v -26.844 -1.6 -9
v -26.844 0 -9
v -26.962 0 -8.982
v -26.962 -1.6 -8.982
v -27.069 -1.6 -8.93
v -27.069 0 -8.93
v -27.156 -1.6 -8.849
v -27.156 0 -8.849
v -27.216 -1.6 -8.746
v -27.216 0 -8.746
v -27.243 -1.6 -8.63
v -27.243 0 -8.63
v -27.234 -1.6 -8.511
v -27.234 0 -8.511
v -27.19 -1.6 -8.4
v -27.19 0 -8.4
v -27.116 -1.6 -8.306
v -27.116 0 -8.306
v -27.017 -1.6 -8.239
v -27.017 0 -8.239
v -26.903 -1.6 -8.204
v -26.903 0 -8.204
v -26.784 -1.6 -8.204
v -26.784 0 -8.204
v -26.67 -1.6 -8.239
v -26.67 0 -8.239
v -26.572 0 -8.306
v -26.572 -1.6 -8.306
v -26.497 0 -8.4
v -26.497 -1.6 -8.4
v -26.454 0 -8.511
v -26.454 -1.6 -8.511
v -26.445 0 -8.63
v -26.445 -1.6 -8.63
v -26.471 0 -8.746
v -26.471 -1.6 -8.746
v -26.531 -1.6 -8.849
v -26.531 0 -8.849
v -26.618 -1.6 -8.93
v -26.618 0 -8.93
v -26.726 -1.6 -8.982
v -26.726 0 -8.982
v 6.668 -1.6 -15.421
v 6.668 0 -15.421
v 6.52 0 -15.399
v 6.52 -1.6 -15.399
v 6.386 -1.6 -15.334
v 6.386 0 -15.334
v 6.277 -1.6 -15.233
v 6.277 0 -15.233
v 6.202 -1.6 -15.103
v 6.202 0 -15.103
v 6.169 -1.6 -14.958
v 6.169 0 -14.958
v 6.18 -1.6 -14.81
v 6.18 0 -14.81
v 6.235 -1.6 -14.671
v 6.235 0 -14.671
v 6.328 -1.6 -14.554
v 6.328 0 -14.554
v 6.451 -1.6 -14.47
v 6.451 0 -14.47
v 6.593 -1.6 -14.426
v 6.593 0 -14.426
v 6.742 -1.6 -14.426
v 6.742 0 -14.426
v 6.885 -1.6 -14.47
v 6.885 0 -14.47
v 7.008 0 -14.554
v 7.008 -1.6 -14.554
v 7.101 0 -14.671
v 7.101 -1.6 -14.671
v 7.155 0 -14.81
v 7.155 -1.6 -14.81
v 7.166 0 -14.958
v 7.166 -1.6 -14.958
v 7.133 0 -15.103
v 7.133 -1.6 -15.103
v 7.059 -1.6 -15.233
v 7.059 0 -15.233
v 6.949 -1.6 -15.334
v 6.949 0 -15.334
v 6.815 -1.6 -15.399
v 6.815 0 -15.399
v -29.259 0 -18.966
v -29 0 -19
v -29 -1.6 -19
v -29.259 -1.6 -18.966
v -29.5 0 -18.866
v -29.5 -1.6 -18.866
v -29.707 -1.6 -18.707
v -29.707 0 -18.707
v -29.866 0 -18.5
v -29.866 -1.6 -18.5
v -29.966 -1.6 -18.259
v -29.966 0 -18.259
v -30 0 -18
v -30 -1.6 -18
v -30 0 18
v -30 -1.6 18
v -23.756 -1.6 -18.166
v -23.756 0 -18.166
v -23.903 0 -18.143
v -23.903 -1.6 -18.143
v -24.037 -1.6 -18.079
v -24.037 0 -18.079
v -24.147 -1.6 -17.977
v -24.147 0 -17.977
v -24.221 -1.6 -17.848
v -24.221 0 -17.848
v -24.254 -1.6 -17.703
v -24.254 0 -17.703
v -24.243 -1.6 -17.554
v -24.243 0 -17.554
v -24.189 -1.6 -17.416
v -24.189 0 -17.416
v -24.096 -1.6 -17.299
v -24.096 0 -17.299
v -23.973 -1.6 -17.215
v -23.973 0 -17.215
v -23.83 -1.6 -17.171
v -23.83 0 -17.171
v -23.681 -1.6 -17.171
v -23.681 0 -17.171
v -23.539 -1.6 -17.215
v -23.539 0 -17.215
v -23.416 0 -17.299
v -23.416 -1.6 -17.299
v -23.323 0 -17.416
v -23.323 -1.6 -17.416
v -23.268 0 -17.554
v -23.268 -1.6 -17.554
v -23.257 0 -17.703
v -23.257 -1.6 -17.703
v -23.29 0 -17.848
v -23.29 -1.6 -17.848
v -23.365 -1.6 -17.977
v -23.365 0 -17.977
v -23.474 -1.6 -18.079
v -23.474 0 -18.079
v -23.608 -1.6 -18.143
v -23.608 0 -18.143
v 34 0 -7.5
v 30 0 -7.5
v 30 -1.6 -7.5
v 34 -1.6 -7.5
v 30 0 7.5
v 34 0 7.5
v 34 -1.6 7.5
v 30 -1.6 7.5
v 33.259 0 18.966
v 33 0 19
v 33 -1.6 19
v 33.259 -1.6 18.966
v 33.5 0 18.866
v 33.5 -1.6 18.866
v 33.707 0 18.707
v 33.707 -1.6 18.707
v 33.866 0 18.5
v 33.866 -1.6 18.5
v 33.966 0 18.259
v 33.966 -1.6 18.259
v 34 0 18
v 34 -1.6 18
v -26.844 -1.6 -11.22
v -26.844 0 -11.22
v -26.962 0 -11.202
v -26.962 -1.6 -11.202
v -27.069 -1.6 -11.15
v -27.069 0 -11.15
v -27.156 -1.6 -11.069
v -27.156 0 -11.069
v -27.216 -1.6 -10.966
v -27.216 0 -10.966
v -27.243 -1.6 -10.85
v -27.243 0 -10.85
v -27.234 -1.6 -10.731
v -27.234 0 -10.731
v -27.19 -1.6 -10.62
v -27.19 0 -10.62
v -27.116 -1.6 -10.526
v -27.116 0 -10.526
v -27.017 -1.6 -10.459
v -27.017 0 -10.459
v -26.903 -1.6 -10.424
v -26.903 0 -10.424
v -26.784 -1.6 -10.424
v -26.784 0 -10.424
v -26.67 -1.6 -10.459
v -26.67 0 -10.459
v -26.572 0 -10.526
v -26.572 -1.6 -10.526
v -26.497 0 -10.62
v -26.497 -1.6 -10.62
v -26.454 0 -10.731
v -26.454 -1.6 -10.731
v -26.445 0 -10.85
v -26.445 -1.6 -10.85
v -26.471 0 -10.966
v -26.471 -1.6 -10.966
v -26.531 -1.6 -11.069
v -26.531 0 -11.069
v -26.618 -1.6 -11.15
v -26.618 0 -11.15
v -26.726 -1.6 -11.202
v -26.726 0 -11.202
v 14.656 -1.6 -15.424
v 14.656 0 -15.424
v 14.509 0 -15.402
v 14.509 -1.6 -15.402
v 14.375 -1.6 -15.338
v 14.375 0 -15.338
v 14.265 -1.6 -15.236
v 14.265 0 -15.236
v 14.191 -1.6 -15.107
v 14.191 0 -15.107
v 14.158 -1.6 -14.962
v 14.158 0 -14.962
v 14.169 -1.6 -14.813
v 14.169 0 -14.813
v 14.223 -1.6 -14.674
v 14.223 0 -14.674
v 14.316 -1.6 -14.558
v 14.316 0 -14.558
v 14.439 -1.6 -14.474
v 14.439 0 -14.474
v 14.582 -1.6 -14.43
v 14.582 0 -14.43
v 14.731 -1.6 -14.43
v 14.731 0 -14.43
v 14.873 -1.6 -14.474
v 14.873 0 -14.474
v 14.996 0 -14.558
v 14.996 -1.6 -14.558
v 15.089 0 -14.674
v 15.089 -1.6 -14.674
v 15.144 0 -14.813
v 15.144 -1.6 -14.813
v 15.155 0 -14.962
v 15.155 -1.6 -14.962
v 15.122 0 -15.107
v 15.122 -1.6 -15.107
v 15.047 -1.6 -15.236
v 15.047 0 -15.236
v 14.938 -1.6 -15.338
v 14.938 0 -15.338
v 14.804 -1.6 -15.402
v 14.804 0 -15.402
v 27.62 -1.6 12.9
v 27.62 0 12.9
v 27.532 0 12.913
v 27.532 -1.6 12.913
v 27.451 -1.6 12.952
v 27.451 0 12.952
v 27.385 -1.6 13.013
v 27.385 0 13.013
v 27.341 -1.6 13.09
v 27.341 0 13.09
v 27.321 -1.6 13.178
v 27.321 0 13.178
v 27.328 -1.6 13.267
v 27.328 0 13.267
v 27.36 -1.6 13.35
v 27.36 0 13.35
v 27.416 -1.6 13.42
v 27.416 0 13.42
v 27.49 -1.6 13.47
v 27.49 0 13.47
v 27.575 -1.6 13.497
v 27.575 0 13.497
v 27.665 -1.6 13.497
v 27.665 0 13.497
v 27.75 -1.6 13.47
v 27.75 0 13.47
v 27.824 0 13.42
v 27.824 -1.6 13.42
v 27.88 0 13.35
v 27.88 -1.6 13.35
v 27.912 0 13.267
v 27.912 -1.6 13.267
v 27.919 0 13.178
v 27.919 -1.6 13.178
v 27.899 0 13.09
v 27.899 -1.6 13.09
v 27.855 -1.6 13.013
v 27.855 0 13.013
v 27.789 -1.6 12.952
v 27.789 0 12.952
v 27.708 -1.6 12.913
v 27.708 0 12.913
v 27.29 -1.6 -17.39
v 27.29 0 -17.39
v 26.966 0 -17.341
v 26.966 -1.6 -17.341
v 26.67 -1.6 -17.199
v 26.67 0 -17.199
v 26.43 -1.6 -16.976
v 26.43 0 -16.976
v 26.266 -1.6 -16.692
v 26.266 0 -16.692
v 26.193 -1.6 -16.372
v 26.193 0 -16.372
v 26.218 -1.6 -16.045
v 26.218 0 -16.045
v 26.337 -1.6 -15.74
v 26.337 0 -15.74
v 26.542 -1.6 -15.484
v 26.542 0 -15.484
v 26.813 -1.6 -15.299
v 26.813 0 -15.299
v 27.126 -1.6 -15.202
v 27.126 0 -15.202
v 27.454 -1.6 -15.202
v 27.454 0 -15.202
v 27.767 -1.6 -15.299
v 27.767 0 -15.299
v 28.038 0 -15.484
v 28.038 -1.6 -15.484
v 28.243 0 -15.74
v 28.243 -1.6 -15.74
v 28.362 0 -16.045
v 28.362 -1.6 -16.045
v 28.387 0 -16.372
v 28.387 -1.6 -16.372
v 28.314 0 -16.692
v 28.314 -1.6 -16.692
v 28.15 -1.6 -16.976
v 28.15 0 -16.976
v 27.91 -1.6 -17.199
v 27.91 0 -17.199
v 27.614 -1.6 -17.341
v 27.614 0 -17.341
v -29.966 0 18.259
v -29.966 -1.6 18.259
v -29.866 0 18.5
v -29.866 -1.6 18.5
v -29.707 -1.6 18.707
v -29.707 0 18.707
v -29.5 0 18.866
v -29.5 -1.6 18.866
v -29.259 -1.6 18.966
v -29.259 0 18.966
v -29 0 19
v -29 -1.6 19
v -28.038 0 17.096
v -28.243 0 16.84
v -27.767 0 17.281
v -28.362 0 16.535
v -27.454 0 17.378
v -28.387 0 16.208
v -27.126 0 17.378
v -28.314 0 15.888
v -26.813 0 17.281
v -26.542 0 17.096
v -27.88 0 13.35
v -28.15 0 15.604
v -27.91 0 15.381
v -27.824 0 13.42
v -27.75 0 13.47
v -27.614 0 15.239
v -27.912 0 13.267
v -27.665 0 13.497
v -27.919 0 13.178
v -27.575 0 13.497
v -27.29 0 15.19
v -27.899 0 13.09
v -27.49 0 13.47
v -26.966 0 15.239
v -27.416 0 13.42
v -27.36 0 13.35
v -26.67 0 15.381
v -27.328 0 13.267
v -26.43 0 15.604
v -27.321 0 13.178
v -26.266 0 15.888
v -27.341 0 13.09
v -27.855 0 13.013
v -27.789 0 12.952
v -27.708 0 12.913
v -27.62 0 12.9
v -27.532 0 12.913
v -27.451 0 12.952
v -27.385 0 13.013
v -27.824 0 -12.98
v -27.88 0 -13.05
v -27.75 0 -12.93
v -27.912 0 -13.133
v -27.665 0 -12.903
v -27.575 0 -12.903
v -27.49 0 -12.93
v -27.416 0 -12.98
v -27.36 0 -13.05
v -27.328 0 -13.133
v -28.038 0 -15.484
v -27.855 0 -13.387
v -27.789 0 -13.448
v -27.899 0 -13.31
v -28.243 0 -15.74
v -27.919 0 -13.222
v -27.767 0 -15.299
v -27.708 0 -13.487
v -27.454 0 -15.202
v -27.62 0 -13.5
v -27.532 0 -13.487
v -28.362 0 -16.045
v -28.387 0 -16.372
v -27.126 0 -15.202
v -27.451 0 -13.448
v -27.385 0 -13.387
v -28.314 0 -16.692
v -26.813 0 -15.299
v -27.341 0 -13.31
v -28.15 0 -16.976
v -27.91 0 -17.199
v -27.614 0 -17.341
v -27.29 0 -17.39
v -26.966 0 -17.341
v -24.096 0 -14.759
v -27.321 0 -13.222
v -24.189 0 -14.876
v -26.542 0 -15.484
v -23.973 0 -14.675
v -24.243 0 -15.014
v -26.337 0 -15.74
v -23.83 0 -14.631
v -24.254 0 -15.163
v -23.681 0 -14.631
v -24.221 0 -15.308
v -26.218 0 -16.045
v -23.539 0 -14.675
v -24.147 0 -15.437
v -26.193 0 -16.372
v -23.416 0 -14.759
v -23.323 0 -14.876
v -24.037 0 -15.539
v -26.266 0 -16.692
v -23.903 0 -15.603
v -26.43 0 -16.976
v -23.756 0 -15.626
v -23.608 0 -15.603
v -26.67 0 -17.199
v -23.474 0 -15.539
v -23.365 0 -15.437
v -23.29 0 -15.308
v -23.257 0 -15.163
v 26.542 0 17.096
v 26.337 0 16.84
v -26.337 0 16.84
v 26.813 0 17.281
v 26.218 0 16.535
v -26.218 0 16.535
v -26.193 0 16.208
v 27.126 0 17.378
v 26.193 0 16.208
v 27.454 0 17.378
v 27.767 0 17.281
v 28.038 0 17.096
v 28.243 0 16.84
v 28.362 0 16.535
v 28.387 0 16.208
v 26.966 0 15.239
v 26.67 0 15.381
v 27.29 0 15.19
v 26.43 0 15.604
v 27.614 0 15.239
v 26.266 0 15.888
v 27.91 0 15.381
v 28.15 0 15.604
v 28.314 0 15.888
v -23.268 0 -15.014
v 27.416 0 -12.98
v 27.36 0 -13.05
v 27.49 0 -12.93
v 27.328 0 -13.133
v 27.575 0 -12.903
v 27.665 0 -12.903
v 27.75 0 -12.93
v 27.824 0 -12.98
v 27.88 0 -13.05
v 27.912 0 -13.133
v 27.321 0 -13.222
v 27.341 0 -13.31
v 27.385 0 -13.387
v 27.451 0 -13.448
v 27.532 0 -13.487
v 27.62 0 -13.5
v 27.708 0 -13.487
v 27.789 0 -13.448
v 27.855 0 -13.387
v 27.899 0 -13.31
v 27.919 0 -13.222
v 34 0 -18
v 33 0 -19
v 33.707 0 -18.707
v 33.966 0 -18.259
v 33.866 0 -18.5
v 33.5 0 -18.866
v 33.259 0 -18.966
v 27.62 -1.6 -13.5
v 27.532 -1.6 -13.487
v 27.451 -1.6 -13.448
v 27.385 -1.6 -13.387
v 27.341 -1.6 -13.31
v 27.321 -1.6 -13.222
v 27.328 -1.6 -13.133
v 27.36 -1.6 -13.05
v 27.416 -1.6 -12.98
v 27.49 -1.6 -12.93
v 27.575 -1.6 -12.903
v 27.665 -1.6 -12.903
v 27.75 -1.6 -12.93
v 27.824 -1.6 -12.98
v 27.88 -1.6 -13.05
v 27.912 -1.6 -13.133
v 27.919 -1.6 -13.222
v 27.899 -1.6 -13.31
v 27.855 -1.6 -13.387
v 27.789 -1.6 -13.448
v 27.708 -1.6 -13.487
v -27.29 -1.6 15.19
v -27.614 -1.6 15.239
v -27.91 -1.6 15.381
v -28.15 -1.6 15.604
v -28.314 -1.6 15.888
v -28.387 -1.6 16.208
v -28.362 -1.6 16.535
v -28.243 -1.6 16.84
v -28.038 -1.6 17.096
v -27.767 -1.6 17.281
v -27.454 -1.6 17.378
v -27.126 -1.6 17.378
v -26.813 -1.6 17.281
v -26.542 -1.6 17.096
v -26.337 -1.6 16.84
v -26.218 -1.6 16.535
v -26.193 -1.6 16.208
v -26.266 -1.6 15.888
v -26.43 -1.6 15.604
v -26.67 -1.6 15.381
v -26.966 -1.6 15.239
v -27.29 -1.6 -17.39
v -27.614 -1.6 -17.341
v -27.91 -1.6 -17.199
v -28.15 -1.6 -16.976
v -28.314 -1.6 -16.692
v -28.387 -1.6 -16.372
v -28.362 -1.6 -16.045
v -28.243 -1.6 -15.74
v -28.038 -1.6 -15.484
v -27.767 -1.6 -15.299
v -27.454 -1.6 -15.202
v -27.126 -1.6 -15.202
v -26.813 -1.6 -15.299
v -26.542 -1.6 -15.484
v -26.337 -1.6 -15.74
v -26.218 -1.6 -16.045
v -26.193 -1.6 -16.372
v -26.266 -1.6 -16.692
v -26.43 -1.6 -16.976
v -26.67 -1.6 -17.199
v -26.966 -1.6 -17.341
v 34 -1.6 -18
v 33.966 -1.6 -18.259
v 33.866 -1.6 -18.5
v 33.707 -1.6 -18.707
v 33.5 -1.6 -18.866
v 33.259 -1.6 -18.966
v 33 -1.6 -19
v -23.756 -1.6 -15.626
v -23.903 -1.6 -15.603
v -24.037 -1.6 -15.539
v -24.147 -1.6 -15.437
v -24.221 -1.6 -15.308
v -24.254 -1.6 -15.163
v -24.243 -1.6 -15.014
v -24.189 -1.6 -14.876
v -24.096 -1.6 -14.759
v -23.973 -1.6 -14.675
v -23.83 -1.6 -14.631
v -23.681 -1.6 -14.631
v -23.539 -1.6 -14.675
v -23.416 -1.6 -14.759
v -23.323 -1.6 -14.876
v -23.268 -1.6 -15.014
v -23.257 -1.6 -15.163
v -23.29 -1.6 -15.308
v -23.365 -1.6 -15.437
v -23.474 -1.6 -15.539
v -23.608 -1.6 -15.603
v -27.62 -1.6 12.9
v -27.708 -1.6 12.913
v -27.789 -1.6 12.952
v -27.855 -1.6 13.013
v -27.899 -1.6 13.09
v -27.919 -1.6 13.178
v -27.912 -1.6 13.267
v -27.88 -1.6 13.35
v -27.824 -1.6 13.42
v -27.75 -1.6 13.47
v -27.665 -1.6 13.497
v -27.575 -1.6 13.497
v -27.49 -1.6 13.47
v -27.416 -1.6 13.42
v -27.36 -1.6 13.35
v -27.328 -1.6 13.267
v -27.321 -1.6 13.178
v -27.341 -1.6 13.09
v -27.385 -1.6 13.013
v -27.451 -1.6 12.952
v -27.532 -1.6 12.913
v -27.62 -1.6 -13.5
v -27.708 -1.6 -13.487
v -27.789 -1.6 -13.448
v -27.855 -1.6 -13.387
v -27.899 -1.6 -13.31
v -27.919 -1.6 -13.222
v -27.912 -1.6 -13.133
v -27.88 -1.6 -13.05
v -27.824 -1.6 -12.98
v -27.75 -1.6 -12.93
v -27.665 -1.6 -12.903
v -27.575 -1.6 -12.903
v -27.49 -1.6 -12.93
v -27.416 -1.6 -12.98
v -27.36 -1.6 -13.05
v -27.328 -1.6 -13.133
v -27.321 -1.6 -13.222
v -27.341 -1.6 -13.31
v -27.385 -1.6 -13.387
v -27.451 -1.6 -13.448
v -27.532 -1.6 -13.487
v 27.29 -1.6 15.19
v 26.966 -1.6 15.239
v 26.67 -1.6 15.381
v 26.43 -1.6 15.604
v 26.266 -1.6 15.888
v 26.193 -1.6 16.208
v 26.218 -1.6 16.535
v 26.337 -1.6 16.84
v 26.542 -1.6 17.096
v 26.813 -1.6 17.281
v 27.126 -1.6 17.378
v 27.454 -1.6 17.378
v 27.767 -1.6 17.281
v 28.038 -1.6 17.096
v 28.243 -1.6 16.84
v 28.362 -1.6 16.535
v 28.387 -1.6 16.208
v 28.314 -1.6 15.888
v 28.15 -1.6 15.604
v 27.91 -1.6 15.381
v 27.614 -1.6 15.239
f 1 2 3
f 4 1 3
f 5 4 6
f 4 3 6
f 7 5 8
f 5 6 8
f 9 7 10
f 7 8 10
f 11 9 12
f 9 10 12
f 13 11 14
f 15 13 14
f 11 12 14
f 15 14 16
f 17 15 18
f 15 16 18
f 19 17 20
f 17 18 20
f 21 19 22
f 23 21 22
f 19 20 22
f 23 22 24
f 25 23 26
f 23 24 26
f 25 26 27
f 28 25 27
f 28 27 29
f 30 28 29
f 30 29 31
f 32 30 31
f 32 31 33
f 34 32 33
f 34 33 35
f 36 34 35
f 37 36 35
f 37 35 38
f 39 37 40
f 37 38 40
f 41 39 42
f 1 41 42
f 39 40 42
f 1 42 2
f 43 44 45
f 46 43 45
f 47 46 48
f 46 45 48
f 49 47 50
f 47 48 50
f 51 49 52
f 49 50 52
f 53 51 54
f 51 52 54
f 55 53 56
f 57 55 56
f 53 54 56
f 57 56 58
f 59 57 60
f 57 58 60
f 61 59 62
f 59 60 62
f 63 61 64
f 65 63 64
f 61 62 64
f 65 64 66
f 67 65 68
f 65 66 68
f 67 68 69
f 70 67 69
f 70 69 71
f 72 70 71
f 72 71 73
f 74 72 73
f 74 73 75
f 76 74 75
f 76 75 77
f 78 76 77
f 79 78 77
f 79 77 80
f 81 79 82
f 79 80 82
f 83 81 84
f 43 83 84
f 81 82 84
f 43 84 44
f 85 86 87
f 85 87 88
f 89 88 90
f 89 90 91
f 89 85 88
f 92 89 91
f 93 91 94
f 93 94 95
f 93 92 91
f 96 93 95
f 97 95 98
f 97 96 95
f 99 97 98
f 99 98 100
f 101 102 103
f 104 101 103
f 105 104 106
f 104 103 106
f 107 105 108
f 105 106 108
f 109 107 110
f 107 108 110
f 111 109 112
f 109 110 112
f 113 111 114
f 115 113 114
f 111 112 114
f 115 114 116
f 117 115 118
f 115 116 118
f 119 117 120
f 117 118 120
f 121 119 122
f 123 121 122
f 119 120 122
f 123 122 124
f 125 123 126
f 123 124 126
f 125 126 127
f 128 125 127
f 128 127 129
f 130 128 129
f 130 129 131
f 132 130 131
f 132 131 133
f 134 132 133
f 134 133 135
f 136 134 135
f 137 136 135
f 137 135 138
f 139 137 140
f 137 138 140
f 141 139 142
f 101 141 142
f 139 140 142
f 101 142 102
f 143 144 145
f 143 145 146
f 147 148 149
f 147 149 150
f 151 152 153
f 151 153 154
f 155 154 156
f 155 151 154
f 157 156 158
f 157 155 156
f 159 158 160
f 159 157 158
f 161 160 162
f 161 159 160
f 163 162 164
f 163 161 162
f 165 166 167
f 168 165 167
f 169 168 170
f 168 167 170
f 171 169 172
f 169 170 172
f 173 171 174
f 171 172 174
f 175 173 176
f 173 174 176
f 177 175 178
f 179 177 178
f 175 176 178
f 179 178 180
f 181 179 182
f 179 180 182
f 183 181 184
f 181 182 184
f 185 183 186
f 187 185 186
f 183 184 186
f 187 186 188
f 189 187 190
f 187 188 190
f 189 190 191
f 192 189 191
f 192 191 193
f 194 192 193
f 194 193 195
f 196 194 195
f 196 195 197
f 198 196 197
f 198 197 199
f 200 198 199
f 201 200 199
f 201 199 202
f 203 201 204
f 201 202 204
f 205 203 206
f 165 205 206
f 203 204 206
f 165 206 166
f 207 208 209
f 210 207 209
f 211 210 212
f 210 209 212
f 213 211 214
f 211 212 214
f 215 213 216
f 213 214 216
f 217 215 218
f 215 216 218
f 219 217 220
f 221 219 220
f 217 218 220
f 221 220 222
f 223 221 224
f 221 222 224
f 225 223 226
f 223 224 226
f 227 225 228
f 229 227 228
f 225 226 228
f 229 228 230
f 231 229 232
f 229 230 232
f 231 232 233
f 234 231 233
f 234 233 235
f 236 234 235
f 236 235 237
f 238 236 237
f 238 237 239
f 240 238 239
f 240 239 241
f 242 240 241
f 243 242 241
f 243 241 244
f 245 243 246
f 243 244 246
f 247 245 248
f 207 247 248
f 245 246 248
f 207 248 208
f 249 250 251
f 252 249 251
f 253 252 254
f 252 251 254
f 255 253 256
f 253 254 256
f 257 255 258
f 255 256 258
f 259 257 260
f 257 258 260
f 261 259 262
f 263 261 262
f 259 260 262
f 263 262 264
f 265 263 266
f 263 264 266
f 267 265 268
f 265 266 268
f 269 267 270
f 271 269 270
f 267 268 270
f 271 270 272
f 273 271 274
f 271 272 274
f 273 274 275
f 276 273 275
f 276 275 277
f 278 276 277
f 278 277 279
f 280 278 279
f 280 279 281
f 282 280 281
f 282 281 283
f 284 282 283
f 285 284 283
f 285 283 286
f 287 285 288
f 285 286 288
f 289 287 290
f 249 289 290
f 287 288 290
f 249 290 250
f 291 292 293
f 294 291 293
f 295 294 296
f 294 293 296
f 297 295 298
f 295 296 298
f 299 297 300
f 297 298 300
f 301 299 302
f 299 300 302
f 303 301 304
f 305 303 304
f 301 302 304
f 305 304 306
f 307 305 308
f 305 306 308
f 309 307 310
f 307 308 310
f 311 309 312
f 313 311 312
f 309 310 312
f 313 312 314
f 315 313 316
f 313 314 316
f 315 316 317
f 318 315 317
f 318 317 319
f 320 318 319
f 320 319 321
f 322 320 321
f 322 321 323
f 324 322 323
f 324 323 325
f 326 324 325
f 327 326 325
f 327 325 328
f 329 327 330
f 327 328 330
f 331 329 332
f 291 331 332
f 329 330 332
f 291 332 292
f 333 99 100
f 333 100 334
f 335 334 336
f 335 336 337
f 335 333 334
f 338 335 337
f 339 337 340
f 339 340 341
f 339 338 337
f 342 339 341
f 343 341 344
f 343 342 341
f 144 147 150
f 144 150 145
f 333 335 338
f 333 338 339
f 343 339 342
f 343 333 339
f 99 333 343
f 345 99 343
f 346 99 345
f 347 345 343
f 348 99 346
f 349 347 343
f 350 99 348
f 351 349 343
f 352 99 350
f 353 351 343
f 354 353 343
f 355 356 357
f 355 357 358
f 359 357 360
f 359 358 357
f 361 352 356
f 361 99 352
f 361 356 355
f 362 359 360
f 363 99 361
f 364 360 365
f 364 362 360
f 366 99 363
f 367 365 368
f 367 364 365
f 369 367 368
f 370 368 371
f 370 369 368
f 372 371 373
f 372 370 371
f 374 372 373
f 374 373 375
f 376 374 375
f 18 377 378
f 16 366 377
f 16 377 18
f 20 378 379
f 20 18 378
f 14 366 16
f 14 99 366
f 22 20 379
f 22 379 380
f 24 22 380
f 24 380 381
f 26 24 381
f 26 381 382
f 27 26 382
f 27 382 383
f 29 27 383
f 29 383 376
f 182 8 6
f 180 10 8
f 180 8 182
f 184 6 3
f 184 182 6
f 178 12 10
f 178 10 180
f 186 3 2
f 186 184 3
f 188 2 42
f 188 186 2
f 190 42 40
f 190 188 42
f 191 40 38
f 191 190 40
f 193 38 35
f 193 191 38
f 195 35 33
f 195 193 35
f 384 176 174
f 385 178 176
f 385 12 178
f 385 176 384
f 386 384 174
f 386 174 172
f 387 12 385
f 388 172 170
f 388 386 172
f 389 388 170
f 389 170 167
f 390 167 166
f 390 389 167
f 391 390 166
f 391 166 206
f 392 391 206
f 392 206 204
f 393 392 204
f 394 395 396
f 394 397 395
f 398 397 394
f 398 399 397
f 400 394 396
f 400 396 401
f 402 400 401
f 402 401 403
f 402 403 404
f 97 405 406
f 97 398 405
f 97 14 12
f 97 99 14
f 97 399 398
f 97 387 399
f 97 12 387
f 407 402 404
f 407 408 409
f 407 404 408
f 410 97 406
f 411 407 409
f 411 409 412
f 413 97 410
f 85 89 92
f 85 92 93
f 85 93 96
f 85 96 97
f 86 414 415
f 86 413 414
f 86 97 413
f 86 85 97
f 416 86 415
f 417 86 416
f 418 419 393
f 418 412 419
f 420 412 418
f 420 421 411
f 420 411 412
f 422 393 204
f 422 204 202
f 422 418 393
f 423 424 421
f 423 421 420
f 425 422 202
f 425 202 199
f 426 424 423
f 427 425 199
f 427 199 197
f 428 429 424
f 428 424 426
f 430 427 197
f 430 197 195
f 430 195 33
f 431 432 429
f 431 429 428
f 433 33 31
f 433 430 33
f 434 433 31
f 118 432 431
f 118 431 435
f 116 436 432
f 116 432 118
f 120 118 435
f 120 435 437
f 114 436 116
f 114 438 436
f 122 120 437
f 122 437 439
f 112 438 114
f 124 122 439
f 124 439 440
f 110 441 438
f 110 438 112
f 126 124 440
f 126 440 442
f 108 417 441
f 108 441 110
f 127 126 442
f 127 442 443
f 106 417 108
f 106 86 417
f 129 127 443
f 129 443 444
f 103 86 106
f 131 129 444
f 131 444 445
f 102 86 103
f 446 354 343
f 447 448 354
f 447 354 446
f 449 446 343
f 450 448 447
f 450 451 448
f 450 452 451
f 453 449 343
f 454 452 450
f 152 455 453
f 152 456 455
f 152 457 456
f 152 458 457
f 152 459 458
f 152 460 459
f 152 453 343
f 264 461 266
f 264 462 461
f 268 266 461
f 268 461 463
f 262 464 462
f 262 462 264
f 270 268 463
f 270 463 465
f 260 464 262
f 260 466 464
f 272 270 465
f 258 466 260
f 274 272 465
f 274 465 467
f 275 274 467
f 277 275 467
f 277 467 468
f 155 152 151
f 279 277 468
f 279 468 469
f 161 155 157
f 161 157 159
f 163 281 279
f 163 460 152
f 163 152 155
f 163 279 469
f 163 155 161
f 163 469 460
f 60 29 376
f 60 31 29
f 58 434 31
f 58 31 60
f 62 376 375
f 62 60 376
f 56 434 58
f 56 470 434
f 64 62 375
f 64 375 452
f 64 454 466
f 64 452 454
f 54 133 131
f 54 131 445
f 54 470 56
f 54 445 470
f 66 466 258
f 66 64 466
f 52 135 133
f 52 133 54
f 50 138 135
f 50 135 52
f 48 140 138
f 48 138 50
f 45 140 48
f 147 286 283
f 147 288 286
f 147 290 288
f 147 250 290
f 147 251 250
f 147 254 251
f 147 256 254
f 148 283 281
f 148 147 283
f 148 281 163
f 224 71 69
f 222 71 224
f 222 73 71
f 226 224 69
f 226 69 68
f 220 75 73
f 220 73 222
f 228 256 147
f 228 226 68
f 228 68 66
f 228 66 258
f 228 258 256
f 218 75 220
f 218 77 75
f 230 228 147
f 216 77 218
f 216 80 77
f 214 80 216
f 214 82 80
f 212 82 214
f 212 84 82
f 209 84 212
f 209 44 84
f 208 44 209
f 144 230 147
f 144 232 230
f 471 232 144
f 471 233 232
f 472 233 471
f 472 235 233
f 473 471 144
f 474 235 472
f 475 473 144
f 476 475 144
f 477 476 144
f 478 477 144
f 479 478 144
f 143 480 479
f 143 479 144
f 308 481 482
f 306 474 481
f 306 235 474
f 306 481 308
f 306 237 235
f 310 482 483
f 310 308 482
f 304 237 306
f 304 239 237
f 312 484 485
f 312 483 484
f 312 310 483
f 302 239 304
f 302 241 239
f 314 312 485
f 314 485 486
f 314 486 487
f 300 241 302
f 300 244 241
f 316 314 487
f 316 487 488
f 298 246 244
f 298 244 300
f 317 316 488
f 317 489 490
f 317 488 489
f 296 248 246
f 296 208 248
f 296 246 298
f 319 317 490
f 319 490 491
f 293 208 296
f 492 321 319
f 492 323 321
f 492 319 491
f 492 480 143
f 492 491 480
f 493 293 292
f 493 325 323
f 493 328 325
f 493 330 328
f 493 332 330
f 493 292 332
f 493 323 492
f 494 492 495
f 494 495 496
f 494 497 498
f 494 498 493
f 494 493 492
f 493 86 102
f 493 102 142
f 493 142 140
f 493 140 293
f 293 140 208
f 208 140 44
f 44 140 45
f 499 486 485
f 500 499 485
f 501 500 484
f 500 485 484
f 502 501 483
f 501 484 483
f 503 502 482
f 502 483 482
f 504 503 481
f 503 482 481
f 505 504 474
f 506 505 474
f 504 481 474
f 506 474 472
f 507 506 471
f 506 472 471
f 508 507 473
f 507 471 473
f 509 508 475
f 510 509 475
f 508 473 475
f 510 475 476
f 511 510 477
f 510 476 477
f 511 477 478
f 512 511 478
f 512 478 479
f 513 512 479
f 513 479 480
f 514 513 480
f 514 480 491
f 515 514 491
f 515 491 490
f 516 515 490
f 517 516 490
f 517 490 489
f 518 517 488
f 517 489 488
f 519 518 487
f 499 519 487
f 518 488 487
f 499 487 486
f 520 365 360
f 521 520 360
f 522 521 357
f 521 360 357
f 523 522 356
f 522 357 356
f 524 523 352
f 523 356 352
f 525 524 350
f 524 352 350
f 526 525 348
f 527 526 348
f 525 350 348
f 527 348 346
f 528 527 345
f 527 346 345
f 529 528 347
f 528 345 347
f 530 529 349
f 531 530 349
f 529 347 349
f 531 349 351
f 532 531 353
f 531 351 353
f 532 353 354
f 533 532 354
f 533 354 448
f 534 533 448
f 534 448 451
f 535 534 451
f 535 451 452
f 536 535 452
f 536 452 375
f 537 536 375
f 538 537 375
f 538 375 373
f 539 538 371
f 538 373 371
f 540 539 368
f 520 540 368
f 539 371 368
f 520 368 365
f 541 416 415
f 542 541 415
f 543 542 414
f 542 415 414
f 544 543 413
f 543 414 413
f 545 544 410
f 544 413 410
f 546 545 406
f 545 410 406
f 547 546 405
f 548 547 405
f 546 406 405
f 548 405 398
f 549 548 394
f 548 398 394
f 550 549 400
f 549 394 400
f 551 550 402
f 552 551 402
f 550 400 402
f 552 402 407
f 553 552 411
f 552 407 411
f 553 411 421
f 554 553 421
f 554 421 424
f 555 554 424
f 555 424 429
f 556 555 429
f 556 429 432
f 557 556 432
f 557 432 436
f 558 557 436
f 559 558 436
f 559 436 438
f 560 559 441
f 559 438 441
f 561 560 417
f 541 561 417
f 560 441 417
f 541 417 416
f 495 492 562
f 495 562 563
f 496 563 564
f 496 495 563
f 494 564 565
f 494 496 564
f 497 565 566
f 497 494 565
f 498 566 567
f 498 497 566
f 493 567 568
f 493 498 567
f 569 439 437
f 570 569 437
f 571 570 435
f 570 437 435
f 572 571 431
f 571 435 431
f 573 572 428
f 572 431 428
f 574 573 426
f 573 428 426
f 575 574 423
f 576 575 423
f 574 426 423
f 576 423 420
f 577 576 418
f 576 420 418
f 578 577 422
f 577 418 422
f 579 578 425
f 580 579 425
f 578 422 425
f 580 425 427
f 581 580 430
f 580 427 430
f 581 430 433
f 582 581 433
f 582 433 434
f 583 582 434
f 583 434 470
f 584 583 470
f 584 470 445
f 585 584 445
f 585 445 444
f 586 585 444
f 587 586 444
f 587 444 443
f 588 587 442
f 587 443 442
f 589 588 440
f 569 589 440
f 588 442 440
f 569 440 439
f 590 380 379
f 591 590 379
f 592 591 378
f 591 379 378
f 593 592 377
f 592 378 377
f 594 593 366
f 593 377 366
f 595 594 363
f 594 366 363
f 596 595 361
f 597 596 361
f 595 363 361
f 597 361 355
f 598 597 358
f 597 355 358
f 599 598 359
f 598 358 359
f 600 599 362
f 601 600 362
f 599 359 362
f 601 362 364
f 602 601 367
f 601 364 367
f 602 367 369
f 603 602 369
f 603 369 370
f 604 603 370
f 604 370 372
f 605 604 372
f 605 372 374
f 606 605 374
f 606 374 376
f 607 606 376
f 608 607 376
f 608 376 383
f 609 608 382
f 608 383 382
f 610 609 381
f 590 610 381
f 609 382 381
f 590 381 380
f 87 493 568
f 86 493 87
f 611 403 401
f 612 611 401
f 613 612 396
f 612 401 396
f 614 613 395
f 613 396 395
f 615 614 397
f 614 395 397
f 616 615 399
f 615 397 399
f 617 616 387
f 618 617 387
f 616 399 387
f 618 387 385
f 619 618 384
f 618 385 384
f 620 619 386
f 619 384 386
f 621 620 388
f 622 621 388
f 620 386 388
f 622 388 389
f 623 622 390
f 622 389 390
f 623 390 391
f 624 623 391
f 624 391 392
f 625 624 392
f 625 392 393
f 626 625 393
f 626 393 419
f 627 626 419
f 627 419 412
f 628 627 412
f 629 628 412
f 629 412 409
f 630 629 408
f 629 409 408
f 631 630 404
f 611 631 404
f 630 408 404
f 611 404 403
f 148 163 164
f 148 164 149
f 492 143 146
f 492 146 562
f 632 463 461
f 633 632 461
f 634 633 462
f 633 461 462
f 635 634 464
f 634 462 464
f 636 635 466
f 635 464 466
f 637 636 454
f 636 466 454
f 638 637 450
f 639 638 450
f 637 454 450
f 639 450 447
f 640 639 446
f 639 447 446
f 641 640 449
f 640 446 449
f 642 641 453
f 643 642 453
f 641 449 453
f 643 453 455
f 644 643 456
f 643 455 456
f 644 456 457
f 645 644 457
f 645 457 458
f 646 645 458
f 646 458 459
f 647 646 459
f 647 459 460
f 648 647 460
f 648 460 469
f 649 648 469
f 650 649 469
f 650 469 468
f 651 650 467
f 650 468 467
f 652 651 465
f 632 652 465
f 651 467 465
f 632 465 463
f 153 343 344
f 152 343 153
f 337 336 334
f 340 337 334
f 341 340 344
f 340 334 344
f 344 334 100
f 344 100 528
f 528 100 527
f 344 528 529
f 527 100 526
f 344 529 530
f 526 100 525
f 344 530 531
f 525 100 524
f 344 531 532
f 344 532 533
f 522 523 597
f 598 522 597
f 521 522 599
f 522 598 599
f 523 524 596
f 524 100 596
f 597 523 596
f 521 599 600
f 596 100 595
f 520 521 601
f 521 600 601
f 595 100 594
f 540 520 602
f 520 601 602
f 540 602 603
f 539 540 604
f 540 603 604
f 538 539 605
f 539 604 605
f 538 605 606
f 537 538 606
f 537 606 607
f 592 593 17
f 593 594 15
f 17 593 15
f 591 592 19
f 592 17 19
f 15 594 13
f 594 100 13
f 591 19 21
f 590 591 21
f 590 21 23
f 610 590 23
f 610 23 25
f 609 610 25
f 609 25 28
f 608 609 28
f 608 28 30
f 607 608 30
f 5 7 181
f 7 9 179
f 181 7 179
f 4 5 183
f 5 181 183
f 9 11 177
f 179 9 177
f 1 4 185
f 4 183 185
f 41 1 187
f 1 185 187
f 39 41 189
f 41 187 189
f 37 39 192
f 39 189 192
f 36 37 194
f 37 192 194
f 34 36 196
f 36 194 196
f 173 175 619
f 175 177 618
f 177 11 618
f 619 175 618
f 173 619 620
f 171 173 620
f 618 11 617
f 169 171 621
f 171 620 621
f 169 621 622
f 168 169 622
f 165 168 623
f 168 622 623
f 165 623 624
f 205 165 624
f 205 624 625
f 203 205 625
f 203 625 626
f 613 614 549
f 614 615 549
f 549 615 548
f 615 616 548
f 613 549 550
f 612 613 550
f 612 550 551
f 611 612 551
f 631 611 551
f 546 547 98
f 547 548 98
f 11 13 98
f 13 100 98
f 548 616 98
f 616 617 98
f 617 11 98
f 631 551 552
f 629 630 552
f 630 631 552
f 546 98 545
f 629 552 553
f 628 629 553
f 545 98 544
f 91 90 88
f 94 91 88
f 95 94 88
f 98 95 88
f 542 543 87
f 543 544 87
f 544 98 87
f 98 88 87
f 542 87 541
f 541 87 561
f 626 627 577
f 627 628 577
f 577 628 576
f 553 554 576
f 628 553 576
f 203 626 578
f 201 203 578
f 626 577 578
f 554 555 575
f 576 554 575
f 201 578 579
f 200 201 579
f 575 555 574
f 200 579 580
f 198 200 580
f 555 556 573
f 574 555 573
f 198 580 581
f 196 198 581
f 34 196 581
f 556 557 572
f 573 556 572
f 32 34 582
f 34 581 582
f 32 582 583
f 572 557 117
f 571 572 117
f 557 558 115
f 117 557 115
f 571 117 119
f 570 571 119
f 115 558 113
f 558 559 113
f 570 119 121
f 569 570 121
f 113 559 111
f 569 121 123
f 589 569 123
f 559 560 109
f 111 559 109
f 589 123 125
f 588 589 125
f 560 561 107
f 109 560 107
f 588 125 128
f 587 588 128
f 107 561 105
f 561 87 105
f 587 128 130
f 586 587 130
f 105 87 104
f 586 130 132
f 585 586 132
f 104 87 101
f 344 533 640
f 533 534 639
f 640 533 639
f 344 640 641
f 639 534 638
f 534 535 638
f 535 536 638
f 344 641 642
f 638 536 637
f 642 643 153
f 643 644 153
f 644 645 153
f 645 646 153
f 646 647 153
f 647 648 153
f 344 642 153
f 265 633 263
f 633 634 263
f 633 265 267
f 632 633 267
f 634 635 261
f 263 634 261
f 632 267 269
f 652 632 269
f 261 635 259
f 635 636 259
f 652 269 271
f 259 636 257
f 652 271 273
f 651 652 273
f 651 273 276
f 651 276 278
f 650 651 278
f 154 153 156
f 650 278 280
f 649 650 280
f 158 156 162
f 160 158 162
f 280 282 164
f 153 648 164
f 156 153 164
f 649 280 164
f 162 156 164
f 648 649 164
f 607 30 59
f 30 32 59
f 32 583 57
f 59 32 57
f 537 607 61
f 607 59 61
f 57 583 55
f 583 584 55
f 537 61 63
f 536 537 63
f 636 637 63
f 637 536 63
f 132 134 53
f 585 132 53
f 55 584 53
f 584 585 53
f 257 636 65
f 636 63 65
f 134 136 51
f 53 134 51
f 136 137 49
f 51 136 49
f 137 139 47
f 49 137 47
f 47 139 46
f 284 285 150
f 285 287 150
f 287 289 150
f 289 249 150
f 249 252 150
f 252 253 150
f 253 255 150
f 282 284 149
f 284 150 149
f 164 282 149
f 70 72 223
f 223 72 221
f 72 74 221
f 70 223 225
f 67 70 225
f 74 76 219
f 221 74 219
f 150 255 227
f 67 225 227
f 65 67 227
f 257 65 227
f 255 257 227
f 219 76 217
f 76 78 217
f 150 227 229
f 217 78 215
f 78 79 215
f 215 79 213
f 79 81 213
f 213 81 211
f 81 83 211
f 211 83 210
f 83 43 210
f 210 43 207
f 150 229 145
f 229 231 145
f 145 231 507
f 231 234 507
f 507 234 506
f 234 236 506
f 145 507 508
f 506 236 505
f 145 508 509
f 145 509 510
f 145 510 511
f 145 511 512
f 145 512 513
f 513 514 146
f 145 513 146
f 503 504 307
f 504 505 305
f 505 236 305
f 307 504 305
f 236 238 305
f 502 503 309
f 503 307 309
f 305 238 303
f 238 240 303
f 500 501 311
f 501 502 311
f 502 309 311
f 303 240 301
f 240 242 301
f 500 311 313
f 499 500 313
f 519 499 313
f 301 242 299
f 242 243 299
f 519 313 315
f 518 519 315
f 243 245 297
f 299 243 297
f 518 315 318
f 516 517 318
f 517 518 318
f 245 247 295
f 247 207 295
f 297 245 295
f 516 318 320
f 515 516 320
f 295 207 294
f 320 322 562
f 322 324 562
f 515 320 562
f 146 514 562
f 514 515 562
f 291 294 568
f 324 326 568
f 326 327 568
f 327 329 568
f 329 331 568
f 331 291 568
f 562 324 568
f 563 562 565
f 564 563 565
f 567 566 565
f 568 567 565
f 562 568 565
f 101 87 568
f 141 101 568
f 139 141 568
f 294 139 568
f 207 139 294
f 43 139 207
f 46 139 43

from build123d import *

# Parameters (mm, degrees)
SKETCH1_R           = 0.2999994
SKETCH1_R_2         = 1.1
SKETCH1_R_3         = 0.499999
SKETCH1_R_4         = 0.3999992
BOSS_EXTRUDE1_DEPTH = 1.6


with BuildPart() as part:
    # Sketch1 → Boss-Extrude1 (new body)
    with BuildSketch(Plane(origin=(0, 0, 0), x_dir=(1, 0, 0), z_dir=(0, 1, 0))):
        with BuildLine():
            Line((34, -18), (34, -7.5))
            Line((34, -7.5), (30, -7.5))
            Line((30, -7.5), (30, 7.5))
            Line((30, 7.5), (34, 7.5))
            Line((34, 7.5), (34, 18))
            ThreePointArc((34, 18), (33.707106781, 18.707106781), (33, 19))
            Line((33, 19), (-29, 19))
            ThreePointArc((-29, 19), (-29.707106781, 18.707106781), (-30, 18))
            Line((-30, 18), (-30, -18))
            ThreePointArc((-30, -18), (-29.707106781, -18.707106781), (-29, -19))
            Line((-29, -19), (33, -19))
            ThreePointArc((33, -19), (33.707106781, -18.707106781), (34, -18))
        make_face()
        with Locations(Location((27.62000064, 13.199999, 0), (0, 0, 90))):
            Circle(SKETCH1_R, mode=Mode.SUBTRACT)
        with Locations(Location((27.28999876, -16.29000044, 0), (0, 0, 90))):
            Circle(SKETCH1_R_2, mode=Mode.SUBTRACT)
        with Locations(Location((27.62000064, -13.199999, 0), (0, 0, 90))):
            Circle(SKETCH1_R, mode=Mode.SUBTRACT)
        with Locations(Location((14.65628514, 14.92444056, 0), (0, 0, 90))):
            Circle(SKETCH1_R_3, mode=Mode.SUBTRACT)
        with Locations(Location((27.28999876, 16.29000044, 0), (0, 0, 90))):
            Circle(SKETCH1_R_2, mode=Mode.SUBTRACT)
        with Locations(Location((6.6676143, 14.9207728, 0), (0, 0, 90))):
            Circle(SKETCH1_R_3, mode=Mode.SUBTRACT)
        with Locations(Location((-23.75582498, 15.12569238, 0), (0, 0, 90))):
            Circle(SKETCH1_R_3, mode=Mode.SUBTRACT)
        with Locations(Location((-26.84364202, 8.59971356, 0), (0, 0, 90))):
            Circle(SKETCH1_R_4, mode=Mode.SUBTRACT)
        with Locations(Location((-27.28999876, -16.29000044, 0), (0, 0, 90))):
            Circle(SKETCH1_R_2, mode=Mode.SUBTRACT)
        with Locations(Location((-27.62000064, -13.199999, 0), (0, 0, 90))):
            Circle(SKETCH1_R, mode=Mode.SUBTRACT)
        with Locations(Location((-26.84364202, 10.8197142, 0), (0, 0, 90))):
            Circle(SKETCH1_R_4, mode=Mode.SUBTRACT)
        with Locations(Location((-23.75582498, 17.66569238, 0), (0, 0, 90))):
            Circle(SKETCH1_R_3, mode=Mode.SUBTRACT)
        with Locations(Location((-27.62000064, 13.199999, 0), (0, 0, 90))):
            Circle(SKETCH1_R, mode=Mode.SUBTRACT)
        with Locations(Location((-27.28999876, 16.29000044, 0), (0, 0, 90))):
            Circle(SKETCH1_R_2, mode=Mode.SUBTRACT)
    extrude(amount=-BOSS_EXTRUDE1_DEPTH)


solid = part.part
